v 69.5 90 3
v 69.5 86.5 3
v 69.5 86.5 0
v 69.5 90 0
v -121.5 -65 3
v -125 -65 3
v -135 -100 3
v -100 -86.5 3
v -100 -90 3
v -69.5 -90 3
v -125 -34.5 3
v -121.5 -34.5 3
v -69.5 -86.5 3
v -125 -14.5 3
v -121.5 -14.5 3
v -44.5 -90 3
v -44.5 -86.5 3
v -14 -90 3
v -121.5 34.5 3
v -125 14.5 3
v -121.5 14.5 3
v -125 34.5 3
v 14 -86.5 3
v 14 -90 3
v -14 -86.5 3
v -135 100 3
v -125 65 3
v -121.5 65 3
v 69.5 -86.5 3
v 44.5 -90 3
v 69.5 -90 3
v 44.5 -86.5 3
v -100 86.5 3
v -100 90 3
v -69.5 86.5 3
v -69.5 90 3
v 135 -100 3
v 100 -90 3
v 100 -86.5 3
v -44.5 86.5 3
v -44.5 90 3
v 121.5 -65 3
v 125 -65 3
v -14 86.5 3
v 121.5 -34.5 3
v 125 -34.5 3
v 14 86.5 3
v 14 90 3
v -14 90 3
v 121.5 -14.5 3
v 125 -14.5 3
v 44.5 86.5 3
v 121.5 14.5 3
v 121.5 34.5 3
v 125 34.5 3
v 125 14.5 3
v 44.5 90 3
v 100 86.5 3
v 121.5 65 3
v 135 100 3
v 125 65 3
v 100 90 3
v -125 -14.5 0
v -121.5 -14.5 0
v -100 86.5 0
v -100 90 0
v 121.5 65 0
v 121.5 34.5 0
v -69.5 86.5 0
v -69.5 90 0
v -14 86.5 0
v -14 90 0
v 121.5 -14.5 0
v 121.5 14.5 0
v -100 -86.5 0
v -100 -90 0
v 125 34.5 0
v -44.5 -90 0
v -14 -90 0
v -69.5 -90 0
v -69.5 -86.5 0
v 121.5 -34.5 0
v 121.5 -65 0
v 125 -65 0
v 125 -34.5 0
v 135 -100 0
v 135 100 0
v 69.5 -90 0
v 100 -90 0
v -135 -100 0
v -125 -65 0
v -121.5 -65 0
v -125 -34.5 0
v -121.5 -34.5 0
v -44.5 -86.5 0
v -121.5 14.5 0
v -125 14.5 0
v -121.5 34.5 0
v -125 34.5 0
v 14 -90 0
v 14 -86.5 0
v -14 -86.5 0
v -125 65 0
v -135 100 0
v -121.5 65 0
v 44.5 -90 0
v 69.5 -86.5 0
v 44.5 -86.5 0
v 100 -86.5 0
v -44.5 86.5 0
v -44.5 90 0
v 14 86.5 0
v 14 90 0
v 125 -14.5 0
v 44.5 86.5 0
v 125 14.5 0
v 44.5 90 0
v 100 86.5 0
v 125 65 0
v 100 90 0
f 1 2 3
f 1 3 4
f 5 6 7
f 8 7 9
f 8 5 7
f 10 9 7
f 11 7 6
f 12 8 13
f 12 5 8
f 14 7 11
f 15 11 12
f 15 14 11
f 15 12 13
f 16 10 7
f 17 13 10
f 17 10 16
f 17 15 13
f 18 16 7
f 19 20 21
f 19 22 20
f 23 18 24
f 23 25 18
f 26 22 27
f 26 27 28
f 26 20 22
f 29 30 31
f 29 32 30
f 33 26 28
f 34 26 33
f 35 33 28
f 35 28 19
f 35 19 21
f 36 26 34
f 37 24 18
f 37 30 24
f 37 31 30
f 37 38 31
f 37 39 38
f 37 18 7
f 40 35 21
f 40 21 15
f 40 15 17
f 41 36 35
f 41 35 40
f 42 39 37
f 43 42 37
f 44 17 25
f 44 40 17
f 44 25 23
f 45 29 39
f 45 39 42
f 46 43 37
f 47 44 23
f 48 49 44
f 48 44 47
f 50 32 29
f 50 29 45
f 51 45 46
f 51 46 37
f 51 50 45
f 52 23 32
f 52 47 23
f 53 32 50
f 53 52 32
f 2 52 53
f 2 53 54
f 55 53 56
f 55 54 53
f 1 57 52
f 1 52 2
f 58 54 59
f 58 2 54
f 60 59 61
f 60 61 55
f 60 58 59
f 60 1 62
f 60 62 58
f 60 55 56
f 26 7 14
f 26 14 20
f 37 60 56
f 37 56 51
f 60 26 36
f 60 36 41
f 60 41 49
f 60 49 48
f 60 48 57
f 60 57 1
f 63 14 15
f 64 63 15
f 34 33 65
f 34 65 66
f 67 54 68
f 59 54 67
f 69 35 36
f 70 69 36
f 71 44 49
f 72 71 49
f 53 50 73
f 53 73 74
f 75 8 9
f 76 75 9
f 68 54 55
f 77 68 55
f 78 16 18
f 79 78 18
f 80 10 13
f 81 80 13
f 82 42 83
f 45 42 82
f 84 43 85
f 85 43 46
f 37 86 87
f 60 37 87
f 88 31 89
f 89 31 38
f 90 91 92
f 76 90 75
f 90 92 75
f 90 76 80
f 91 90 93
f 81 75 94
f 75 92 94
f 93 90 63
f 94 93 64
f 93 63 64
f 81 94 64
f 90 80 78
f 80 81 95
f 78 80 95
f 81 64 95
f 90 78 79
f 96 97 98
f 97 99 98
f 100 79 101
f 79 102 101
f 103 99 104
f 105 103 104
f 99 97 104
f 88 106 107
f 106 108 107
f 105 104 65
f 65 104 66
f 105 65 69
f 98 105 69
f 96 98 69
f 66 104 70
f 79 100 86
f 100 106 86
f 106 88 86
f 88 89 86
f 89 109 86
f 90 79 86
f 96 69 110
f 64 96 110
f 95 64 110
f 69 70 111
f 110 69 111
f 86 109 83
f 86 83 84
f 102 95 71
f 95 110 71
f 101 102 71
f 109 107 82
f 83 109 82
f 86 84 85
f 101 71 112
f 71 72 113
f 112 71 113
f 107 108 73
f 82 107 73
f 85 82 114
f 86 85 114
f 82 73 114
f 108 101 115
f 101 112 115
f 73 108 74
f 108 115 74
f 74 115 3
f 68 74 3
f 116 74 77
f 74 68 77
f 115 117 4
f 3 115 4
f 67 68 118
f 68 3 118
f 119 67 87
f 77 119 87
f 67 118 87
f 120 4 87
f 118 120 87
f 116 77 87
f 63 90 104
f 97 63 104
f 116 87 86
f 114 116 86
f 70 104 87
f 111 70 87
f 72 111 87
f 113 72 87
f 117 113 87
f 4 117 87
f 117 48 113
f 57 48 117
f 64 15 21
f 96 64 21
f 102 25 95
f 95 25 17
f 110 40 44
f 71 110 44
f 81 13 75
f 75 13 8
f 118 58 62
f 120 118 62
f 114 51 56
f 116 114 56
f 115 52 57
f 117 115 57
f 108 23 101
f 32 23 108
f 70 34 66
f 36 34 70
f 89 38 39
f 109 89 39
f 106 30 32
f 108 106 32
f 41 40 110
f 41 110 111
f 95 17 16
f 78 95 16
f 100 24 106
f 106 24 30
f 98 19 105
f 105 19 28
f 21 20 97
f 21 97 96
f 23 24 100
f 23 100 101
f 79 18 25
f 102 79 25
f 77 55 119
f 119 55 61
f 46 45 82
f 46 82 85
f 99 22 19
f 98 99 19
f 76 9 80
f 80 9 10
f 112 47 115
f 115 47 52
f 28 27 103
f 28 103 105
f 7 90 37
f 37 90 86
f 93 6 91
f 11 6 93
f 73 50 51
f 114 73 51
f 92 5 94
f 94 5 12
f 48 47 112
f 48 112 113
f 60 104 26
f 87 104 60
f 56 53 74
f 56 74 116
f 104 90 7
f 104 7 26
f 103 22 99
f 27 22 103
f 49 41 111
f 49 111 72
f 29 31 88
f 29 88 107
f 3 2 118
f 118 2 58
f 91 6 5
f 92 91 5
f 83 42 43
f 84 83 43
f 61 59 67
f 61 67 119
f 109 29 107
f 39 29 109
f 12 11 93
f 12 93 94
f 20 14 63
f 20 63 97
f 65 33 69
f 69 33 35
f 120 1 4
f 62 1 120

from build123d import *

# Parameters (mm, degrees)
F0_W     = 270
F0_H     = 200
F1_DEPTH = 3
F2_W     = 30.5
F2_H     = 3.5
F2_W_2   = 3.5
F2_H_2   = 30.5
F2_H_3   = 29
F3_DEPTH = 3


with BuildPart() as f1:
    # F0 (on Top) → F1 (new body)
    with BuildSketch(Plane.XY):
        Rectangle(F0_W, F0_H)
    extrude(amount=F1_DEPTH)

    # F2 (on face) → F3 (cut)
    with BuildSketch(Plane.XY.offset(3)):
        with Locations((84.75, 88.25)):
            Rectangle(F2_W, F2_H)
        with Locations((29.25, 88.25)):
            Rectangle(F2_W, F2_H)
        with Locations((123.25, 49.75)):
            Rectangle(F2_W_2, F2_H_2)
        with Locations((-84.75, 88.25)):
            Rectangle(F2_W, F2_H)
        with Locations((-29.25, 88.25)):
            Rectangle(F2_W, F2_H)
        Polygon((-84.75, -88.25), (-100, -90), (-84.75, -90), align=None)
        Polygon((-100, -86.5), (-100, -90), (-84.75, -88.25), align=None)
        Polygon((-69.5, -86.5), (-100, -86.5), (-84.75, -88.25), align=None)
        Polygon((-84.75, -88.25), (-84.75, -90), (-69.5, -90), align=None)
        Polygon((-69.5, -86.5), (-84.75, -88.25), (-69.5, -90), align=None)
        with Locations((29.25, -88.25)):
            Rectangle(F2_W, F2_H)
        Polygon((-29.25, -88.25), (-44.5, -90), (-29.25, -90), align=None)
        Polygon((-44.5, -86.5), (-44.5, -90), (-29.25, -88.25), align=None)
        Polygon((-14, -86.5), (-44.5, -86.5), (-29.25, -88.25), align=None)
        Polygon((-29.25, -88.25), (-29.25, -90), (-14, -90), align=None)
        Polygon((-14, -86.5), (-29.25, -88.25), (-14, -90), align=None)
        with Locations((84.75, -88.25)):
            Rectangle(F2_W, F2_H)
        with Locations((123.25, -49.75)):
            Rectangle(F2_W_2, F2_H_2)
        with Locations((-123.25, -49.75)):
            Rectangle(F2_W_2, F2_H_2)
        with Locations((-123.25, 49.75)):
            Rectangle(F2_W_2, F2_H_2)
        with Locations((123.25, 0)):
            Rectangle(F2_W_2, F2_H_3)
        with Locations((-123.25, 0)):
            Rectangle(F2_W_2, F2_H_3)
    extrude(amount=-F3_DEPTH, mode=Mode.SUBTRACT)


solid = f1.part
